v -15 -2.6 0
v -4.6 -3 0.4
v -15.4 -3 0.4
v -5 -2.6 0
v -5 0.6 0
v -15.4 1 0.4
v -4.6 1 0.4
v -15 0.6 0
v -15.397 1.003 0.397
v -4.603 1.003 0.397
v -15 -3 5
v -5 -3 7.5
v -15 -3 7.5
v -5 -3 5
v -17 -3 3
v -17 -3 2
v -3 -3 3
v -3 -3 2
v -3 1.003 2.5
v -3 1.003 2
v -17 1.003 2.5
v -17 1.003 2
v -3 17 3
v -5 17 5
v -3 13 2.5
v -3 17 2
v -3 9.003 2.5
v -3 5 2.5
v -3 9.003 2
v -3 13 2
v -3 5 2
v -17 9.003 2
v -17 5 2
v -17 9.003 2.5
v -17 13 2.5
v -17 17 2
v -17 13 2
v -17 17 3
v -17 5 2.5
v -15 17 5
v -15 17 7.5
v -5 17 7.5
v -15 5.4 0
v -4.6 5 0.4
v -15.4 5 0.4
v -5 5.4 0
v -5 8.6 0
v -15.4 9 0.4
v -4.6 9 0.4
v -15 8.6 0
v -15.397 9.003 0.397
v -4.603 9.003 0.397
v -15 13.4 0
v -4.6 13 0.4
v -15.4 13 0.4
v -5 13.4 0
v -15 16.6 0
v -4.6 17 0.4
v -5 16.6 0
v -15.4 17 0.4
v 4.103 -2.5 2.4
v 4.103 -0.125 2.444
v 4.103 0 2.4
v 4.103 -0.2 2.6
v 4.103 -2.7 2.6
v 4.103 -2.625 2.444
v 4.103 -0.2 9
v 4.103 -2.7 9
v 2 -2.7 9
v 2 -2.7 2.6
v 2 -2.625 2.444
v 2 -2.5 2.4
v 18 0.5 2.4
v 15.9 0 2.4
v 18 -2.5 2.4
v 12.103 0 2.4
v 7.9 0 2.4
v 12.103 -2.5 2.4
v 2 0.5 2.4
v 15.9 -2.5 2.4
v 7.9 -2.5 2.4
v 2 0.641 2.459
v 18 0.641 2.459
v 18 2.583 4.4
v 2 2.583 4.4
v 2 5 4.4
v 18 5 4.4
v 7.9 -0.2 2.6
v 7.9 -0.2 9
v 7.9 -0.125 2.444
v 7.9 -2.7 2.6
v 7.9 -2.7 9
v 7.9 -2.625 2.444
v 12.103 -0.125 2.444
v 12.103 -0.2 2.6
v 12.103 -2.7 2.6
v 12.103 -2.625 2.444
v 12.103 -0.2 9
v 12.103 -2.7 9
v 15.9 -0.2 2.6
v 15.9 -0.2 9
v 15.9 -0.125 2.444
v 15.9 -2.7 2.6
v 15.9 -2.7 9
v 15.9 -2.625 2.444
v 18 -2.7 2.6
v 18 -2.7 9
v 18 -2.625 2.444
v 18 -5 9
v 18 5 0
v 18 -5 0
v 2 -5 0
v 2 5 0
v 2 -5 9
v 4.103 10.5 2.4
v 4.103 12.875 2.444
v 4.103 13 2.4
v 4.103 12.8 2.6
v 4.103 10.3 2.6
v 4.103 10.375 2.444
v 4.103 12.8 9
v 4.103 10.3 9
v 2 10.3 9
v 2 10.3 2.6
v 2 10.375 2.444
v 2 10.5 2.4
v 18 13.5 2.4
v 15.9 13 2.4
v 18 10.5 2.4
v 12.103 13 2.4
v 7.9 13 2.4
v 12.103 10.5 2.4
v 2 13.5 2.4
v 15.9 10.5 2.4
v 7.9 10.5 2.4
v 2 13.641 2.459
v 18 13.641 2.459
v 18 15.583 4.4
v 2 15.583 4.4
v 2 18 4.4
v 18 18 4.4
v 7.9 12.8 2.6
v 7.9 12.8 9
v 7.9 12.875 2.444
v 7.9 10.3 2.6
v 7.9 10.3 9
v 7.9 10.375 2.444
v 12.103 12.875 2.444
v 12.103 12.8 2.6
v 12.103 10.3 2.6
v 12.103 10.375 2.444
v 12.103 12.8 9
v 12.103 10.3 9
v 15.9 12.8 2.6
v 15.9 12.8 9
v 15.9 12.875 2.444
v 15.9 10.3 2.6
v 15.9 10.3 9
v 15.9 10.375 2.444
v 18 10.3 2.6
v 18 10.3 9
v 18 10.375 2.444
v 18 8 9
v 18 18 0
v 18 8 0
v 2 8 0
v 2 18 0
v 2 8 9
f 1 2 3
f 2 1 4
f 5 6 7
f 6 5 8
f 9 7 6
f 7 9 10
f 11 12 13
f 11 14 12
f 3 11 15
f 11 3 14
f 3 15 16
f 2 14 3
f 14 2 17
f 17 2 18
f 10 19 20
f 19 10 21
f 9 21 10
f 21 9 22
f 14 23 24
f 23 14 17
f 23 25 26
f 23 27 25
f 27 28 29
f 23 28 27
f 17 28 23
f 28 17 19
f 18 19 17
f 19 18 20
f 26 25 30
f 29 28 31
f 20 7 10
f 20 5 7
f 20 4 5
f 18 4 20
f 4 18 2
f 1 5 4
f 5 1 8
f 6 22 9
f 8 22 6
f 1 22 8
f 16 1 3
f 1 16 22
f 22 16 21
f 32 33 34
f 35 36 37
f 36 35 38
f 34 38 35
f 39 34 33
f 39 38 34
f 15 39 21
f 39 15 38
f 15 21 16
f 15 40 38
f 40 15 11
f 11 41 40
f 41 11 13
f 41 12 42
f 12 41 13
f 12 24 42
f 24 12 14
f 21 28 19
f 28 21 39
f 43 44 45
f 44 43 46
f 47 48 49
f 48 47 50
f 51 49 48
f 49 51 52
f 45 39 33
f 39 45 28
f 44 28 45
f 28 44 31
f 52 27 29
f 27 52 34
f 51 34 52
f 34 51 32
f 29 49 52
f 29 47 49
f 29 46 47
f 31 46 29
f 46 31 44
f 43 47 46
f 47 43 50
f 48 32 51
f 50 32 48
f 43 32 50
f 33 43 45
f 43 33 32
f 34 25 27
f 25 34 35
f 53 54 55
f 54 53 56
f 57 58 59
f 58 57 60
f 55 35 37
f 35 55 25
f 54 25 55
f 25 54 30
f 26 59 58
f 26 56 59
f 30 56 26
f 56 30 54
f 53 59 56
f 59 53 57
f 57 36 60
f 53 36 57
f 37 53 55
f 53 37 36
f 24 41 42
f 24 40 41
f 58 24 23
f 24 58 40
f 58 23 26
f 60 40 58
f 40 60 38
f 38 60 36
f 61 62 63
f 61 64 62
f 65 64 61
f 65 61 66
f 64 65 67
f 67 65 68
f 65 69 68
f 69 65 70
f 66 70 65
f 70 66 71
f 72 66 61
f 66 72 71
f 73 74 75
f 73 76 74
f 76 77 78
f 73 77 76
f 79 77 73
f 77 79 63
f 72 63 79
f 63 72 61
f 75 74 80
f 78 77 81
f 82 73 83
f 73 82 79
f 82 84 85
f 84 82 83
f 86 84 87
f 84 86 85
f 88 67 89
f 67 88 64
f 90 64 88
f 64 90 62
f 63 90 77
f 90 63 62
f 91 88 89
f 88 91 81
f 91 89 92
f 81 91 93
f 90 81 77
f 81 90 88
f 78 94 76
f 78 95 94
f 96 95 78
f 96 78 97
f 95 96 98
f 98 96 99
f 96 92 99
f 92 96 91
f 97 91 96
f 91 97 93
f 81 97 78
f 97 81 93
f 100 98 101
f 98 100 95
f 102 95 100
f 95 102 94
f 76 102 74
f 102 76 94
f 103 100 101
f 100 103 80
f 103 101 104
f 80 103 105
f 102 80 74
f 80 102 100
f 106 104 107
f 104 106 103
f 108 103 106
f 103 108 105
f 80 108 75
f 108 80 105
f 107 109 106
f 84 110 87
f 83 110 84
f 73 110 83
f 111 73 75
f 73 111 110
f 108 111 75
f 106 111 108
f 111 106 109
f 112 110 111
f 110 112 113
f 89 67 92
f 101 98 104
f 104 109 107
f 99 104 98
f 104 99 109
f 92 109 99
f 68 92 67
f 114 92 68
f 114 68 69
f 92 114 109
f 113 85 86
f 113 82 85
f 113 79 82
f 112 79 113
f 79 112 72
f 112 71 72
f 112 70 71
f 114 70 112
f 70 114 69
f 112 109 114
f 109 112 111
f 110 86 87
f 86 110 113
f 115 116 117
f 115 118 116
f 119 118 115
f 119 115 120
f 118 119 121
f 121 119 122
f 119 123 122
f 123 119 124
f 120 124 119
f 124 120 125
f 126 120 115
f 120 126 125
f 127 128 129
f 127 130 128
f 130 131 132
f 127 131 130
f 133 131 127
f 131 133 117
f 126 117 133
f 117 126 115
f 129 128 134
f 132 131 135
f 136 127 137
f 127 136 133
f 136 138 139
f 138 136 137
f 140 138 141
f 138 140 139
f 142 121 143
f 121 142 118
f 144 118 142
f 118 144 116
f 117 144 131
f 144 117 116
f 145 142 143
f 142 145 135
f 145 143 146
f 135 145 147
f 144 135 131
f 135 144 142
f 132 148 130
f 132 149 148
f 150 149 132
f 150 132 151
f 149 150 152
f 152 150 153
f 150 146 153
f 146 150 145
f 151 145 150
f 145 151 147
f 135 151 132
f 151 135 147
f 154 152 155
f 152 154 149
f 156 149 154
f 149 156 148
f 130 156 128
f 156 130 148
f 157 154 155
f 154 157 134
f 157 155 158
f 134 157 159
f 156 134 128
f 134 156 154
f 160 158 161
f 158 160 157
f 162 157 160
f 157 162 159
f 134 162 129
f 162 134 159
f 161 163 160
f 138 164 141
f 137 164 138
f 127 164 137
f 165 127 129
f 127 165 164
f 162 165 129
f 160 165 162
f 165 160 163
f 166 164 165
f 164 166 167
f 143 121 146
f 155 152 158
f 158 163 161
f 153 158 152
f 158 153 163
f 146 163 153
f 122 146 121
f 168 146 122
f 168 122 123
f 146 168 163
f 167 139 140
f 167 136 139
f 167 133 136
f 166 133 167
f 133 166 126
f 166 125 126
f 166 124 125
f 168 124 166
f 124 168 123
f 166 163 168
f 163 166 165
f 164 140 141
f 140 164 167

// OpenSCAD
// file: rail.scad
include <common.scad>

rail_notch_depth = 2.5;
rail_notch_length = 4;

// lug_type 0 means no lug. 1 means beveled. 2 means square.
module rail_2d(width, stem, lug_type) {
  translate([0, -stem/2, 0])
    square([width, stem], center=true);
  
  difference() {
    hull()
      for (a = [-1, 1])
        scale([a, 1, 1])
          translate([width/2, 0, 0])
            rotate([0, 0, 45])
              square(rail_notch_depth*sqrt(2), center=true);
    
    // Square off the ends, to avoid sharp corners.
    for (a = [-1, 1])
      scale([a, 1, 1])
        translate([width/2 + rail_notch_depth, 0, 0])
          square(1, center=true);

      
    if (lug_type == 0)
      translate([0, rail_notch_depth])
        square([width+rail_notch_depth*4, rail_notch_depth*2], center=true);
  }
  
  if (lug_type == 2)
    translate([0, rail_notch_depth/2, 0])
      square([width + rail_notch_depth*2 - 1, rail_notch_depth], center=true);
}

module rail(width, length, stem, cavity=false) {
  repeats = floor(length / (2*rail_notch_length));
  
  intersection() {
    cube([width*2, width*2, length*2], center=true);
    
    for (a = [0:repeats]) {
      translate([0, 0, a*2*rail_notch_length]) {
        difference() {
          // High piece.
          translate([0, 0, cavity ? -snug/2 : 0])
            linear_extrude(rail_notch_length+eps + (cavity ? snug : 0))
              offset(cavity ? snug : 0)
                rail_2d(width, stem, cavity ? 2 : 1);

          // Chamfer edges.
          if (!cavity)
            for (z = [0, rail_notch_length])
              translate([0, rail_notch_depth, z])
                hull()
                  rotate([45, 0, 0])
                    cube(
                      [width*2, foot*sqrt(2), foot*sqrt(2)],
                      center=true
                    );
        }

        // Low piece.
        translate([0, 0, rail_notch_length])
          linear_extrude(rail_notch_length+eps)
            offset(cavity ? snug : 0)
              rail_2d(width, stem, 0);      
      }
    }
  }
}
// file: common.scad
$fa = 10;
$fs = 0.2;
eps = 0.003;
$zstep = 0.2;

// An inward chamfer sufficient to prevent elephant's foot.
foot = 0.4;

// FINDINGS FROM CLEARANCE TEST
//
// Consider a vertical hole of width X, a layer height of 0.2, and a vertical
// post.
//   * A post of diameter X will not fit in.
//   * A post of diameter X-0.1 will fit in, but is very hard to slide in or out.
//     This is probably due mostly to the transverse grain of the print.
//     It will rotate, but with some resistance.
//   * A post of diameter X-0.2 slides in and out easily. It rotates easily, but
//     still has noticeable resistance at some points.
//   * A post of diameter X-0.3 rotates freely. It also has noticeable play
//     from side to side.
//
// Clearances are expressed as the total across both sides of a joint.
tight = 0.1;  // Intended for stationary joints.
snug = 0.2;   // Moves, but with some resistance.
loose = 0.3;  // Free movement.
extra_loose = 0.4;

// A brim is a 0.2mm layer printed near an edge which is likely to warp.
// The edge should be chamfered outwards at 45 degrees. The brim should
// be placed this far from the bottom of the edge, so it barely touches
// the chamfer.
brim_offset = 0.3;

// Menards 5/8 x 2-3/4 x 0.04 WG compression spring.
spring_od = 5/8 * 25.4;
// Subtract 10 from the relaxed length so everything is slightly tensioned
// all the time.
spring_max_length = 2.75 * 25.4 - 10;
spring_min_length = 16;  // Approximate.

// Menards 1/4 inch aluminum rod.
roller_diameter = 6.7;
roller_cavity_diameter = roller_diameter + loose;

// 550 paracord. Make this wide enough to accommodate a melted end.
string_diameter = 4.5;

// Standard spring tube.
tube_id = spring_od + 0.7;

module octagon(diameter) {
  intersection_for(a = [0, 45])
    rotate([0, 0, a])
      square(diameter, center=true);
}

// A cylinder with a chamfered or flared bottom end, useful for dealing
// with elephant's foot on pins or holes.
module flare_cylinder(height, radius, flare) {
  translate([0, 0, abs(flare)-eps])
    cylinder(height-abs(flare)+eps, radius, radius);

  linear_extrude(abs(flare), scale=radius/(radius-flare))
    circle(radius-flare);
}

// A cube with a chamfered or flared bottom end, useful for dealing
// with elephant's foot on pins or holes.
module flare_cube(dims, flare) {
  translate([0, 0, abs(flare)-eps])
    cube([dims.x, dims.y, dims.z - abs(flare) + eps]);

  translate([dims.x/2, dims.y/2, 0])
    linear_extrude(abs(flare), scale=[dims.x/(dims.x-2*flare), dims.y/(dims.y-2*flare)])
      translate([-(dims.x-2*flare)/2, -(dims.y-2*flare)/2, abs(flare)-eps])
        square([dims.x-2*flare, dims.y-2*flare]);
}

// An approximate circle which can be printed on its side.
module circle_ish(r) {
  // Safe overhang angle.
  q = 45;
  
  intersection() {
    // Add 0.2 (one print layer) in case the bridge is messy and hangs
    // down.
    square(2*r+0.2, center=true);
    hull() {
      circle(r);
      for (a = [-1, 1])
        translate([0, a*r/cos(q), 0])
          square(eps, center=true);
    }
  }
}

// Depth of the sockets used as glue aids.
socket_depth = 5;

module socket() {
  translate([-1.5, -1.5, -eps])
    flare_cube([3, 3, socket_depth], -foot);
}

module lug() {
  flare_cube([3-snug, 3-snug, 2*socket_depth-2], foot);
}

// Nerf darts are 0.50 cal.
dart_diameter = 12.7;
dart_length = 72;

module octahedron(major_radius=1) {
  // Top and bottom halves.
  for (a = [-1, 1])
    scale([1, 1, a])
      // Extrude a square into a pyramid.
      linear_extrude(major_radius, scale=0)
        rotate([0, 0, 45])
          square(sqrt(2)*major_radius, center=true);
}

module chamfered_cube(dims, chamfer=1) {
  assert(dims.x >= 2*chamfer);
  assert(dims.y >= 2*chamfer);
  assert(dims.z >= 2*chamfer);

  hull()
    for (a = [0, 1], b = [0, 1], c = [0, 1])
        translate([
          (dims.x - 2*chamfer) * a + chamfer,
          (dims.y - 2*chamfer) * b + chamfer,
          (dims.z - 2*chamfer) * c + chamfer
        ])
          octahedron(chamfer);
}
// main file
include <common.scad>
include <rail.scad>

module one() {
  translate([0, 0, rail_notch_depth])
    rotate([-90, 0, 0])
      rail(10, 20, 5);
}

extra = 0.6;

module two() {
  translate([0, 0, 9]) {
    rotate([180, 0, 0]) {
      difference() {
        translate([10, 0, 4.5])
          cube([16, 10, 9], center=true);
        translate([0, 0, -extra])
          rotate([0, 90, 0])
            rail(10, 20, 5, cavity=true);
      }
    }
  }
}

translate([-10, -3, 0]) one();
translate([0, 0, 0]) two();
translate([0, 13, 0]) two();
